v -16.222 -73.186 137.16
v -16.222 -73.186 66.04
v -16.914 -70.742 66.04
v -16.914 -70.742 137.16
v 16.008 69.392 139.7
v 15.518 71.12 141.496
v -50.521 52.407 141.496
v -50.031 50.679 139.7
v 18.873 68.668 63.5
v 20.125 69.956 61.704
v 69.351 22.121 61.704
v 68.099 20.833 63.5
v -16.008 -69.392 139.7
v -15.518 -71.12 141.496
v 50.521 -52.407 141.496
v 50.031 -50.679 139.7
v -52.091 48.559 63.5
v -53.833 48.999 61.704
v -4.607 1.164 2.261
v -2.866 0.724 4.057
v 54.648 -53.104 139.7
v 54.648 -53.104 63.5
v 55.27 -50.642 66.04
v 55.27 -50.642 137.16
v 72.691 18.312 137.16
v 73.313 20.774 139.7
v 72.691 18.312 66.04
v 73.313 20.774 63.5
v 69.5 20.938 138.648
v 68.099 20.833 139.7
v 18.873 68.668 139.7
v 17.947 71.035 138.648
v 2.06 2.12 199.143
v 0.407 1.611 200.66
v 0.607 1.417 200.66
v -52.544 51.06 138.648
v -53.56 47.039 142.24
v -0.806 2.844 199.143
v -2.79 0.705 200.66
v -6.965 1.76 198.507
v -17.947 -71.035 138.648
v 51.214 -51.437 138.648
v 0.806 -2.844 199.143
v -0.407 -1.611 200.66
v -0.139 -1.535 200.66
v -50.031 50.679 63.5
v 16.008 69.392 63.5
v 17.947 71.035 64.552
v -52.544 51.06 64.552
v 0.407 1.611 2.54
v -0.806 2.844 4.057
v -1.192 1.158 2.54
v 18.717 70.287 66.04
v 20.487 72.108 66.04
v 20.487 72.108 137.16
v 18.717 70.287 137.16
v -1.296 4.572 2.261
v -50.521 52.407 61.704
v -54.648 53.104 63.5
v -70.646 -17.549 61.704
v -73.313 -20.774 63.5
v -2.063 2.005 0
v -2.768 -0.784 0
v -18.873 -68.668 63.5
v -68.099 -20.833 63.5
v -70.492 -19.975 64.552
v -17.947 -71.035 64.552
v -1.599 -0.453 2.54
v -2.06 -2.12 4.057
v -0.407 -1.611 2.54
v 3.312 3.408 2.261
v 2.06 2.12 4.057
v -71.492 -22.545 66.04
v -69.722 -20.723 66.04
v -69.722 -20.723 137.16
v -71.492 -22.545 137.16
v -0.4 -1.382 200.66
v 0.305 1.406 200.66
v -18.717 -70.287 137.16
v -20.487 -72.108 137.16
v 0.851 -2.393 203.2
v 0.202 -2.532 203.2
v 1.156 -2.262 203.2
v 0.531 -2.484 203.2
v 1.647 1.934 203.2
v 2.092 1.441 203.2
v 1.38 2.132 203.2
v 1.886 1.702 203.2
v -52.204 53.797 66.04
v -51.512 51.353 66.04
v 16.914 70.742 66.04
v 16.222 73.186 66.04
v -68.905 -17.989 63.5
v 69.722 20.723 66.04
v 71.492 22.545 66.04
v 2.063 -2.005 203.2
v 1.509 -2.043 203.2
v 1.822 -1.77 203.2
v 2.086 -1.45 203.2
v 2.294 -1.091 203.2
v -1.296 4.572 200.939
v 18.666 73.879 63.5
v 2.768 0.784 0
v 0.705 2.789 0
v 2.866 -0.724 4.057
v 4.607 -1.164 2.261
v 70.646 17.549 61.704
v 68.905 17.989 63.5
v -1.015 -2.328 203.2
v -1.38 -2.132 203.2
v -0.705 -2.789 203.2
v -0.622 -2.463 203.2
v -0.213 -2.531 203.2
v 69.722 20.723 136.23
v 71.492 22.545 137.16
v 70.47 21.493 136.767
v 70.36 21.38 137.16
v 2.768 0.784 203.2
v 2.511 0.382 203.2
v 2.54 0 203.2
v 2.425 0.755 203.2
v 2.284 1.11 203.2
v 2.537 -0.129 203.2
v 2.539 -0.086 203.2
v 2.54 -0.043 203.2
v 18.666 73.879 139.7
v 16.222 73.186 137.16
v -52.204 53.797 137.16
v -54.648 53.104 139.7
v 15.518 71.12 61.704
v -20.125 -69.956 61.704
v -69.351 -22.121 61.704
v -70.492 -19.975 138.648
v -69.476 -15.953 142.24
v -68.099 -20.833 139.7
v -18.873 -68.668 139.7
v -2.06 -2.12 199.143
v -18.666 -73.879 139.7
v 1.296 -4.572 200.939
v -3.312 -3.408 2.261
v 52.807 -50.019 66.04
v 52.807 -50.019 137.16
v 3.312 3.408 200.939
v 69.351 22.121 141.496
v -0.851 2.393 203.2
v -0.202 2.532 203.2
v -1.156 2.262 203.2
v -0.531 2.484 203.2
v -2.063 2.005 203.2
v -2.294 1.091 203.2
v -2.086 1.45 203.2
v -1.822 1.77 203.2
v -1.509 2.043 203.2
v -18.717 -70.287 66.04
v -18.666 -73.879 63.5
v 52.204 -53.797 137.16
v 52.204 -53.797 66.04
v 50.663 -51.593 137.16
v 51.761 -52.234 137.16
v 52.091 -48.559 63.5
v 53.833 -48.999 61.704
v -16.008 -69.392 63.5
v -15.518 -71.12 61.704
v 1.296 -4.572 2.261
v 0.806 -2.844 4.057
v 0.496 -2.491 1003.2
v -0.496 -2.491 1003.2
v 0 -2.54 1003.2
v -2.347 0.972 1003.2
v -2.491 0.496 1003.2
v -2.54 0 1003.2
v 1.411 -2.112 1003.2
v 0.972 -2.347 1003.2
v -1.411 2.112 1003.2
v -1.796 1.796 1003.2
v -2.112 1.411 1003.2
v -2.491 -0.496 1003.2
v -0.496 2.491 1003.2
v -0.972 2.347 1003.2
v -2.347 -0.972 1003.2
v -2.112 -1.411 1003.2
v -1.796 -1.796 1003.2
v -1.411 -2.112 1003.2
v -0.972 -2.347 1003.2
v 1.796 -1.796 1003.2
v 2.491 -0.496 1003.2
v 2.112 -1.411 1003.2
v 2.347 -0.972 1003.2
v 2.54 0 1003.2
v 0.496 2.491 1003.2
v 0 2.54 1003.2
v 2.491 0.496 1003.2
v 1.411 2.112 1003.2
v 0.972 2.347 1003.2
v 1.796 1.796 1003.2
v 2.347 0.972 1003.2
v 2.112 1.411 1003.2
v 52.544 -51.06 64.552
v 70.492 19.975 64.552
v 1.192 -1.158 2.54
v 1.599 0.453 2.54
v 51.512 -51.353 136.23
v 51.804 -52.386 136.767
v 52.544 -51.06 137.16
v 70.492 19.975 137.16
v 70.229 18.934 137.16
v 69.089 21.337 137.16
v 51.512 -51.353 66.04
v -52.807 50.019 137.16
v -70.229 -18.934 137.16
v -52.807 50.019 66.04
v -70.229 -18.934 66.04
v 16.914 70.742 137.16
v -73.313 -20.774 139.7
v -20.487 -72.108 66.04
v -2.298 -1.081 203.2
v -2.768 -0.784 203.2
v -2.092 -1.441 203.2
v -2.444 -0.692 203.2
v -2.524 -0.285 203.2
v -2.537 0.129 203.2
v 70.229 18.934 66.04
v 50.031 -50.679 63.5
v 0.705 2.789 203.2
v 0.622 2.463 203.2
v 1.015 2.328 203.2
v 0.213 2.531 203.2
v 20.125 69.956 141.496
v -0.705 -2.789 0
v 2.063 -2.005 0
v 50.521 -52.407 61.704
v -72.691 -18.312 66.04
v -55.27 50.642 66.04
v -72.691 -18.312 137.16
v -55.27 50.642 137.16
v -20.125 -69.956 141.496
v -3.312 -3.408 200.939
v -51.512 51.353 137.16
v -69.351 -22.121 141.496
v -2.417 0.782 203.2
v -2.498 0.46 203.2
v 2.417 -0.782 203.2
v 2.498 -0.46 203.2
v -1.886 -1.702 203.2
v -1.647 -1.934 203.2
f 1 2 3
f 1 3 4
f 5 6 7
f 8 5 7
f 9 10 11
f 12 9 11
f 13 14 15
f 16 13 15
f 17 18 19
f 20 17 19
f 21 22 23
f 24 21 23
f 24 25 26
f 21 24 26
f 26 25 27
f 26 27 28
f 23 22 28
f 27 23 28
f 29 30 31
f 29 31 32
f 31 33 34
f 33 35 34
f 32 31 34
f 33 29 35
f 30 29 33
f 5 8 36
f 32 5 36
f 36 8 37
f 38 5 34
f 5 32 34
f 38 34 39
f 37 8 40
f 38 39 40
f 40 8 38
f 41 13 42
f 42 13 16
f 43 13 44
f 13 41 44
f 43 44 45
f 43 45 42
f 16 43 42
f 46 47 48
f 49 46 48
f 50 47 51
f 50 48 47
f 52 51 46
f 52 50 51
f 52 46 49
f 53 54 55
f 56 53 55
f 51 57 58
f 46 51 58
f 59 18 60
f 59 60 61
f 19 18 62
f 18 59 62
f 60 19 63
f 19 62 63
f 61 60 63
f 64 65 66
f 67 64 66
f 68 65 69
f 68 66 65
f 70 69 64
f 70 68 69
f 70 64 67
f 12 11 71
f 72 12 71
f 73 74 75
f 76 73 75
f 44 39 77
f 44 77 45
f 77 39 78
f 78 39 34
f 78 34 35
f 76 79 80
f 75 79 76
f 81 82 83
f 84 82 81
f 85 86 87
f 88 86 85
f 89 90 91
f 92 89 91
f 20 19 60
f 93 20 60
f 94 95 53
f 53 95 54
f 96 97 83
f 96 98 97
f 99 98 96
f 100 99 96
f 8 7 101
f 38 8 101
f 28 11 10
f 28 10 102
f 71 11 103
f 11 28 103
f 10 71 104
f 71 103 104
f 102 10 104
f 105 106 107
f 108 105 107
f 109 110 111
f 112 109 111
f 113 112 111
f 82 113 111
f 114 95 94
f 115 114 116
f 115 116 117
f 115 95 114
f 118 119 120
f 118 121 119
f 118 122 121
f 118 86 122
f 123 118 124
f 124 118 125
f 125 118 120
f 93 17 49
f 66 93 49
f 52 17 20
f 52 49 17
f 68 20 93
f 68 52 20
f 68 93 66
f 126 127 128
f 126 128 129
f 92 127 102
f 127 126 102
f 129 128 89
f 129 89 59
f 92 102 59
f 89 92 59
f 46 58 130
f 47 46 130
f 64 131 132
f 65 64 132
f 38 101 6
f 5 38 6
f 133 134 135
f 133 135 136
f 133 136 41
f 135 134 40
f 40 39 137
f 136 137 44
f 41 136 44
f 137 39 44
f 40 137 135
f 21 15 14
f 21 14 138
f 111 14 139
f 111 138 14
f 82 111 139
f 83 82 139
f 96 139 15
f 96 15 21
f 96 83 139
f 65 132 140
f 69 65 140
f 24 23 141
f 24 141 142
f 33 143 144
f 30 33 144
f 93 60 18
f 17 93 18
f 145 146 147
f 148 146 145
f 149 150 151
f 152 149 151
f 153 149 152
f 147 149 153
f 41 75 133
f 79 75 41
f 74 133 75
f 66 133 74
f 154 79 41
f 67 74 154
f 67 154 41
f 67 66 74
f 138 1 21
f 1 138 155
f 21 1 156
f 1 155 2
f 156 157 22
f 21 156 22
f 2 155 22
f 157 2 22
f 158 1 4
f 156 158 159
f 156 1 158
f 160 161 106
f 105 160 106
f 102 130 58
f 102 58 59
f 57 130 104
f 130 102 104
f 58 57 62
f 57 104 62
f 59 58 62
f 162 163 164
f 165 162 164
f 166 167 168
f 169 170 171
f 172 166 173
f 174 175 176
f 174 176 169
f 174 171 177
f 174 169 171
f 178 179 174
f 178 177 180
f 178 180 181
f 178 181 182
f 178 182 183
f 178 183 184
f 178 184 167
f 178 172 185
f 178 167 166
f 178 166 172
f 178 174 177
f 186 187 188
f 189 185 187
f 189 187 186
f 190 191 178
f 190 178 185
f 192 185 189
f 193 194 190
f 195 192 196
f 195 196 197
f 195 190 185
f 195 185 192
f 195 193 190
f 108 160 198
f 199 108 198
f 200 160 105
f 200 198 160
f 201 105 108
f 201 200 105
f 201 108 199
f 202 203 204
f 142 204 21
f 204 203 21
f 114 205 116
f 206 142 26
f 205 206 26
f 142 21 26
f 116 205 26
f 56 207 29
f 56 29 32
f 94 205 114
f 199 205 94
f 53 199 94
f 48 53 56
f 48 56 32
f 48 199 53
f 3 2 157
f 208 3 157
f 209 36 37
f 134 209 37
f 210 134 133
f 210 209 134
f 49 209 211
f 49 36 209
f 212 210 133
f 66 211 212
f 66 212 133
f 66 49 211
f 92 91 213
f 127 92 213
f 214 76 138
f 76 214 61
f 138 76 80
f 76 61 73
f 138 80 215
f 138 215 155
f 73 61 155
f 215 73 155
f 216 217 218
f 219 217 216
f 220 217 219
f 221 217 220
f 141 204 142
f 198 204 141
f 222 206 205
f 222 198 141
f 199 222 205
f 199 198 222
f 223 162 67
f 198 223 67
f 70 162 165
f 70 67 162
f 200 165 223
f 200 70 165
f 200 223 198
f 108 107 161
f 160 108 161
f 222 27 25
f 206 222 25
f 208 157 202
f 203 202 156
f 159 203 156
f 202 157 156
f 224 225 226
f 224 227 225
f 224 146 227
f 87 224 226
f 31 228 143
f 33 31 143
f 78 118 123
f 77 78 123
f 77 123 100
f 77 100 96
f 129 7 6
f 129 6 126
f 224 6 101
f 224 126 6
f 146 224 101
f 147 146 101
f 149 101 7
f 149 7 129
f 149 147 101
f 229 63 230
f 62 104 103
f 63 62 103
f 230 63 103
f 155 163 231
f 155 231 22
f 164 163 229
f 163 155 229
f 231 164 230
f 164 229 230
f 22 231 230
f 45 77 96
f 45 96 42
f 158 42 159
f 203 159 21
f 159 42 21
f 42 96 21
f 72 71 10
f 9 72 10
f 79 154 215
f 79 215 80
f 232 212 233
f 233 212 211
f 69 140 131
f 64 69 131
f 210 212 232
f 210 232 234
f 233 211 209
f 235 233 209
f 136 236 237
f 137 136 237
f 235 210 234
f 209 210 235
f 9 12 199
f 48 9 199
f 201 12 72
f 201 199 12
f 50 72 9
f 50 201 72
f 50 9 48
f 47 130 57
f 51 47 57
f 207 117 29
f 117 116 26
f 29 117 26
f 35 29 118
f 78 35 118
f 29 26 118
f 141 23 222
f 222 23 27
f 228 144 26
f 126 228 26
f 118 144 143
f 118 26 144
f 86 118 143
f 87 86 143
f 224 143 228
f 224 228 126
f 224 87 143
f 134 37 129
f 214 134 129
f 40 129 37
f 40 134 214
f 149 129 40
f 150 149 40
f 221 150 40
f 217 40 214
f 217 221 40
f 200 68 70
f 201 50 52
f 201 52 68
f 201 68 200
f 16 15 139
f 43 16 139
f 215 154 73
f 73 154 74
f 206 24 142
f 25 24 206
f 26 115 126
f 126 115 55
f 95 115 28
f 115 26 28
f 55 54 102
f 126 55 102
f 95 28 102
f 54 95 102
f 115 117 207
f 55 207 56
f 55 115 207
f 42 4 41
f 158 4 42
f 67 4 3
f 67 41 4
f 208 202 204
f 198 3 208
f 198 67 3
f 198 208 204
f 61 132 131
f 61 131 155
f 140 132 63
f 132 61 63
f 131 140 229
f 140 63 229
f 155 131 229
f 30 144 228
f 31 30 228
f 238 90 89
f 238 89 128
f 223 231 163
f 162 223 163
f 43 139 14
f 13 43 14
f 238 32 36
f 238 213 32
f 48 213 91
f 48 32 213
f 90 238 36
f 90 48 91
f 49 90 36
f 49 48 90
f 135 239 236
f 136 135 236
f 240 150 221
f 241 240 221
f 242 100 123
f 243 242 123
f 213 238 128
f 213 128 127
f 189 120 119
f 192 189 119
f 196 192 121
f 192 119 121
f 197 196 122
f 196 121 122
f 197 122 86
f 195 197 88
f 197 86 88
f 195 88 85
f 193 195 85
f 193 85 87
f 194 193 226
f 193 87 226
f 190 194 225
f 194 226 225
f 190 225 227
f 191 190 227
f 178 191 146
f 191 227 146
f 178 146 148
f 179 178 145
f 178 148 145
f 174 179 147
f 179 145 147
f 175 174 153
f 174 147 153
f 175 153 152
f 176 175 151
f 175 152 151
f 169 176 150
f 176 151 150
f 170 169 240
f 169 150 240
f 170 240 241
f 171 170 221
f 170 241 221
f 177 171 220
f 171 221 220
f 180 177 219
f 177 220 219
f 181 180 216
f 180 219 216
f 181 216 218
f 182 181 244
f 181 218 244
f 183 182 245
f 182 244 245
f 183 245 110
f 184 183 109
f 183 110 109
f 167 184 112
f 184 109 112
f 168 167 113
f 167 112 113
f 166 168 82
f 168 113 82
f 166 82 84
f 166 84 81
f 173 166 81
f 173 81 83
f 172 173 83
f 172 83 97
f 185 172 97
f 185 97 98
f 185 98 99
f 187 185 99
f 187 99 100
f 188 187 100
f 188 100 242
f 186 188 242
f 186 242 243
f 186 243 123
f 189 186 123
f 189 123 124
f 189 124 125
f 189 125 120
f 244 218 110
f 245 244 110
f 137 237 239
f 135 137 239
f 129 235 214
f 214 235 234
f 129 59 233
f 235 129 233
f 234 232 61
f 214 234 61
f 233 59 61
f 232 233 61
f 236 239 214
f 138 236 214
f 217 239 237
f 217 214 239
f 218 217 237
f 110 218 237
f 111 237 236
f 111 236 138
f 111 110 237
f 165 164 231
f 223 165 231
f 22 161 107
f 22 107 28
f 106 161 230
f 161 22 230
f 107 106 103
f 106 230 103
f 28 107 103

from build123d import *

# Parameters (mm, degrees)
F1_DEPTH  = 203.2
F2_SIZE   = 63.5
F3_T      = -2.54
F5_DEPTH  = 2.54
F7_DEPTH  = 2.54
F9_DEPTH  = 7.1852048969
F10_DEPTH = 2.541
F12_DEPTH = 2.54
F14_DEPTH = 2.54
F15_W     = 71.12
F15_H     = 71.12
F16_DEPTH = 157.0594794416
F17_W     = 71.12
F17_H     = 71.12
F18_DEPTH = 155.1690173594
F19_W     = 71.12
F19_H     = 71.12
F20_DEPTH = 170.067634702
F22_DEPTH = 2.54
F24_DEPTH = 2.54
F26_DEPTH = 2.54
F28_DEPTH = 2.54
F30_DEPTH = 2.54
F32_DEPTH = 2.54
F33_R     = 2.54
F34_DEPTH = 800


# Not quite as in the source:
# - a feature names something its author has since deleted; it is built from what else it names


with BuildPart() as f1:
    # F0 (on Top) → F1 (new body)
    with BuildSketch(Plane.XY):
        Polygon((73.3134762531, 20.774364002), (18.6656111534, 73.8785148759), (-54.6478650997, 53.104150874), (-73.3134762531, -20.774364002), (-18.6656111534, -73.8785148759), (54.6478650997, -53.104150874), align=None)
    extrude(amount=F1_DEPTH)

    # F2
    f2_edges = [f1.edges().sort_by_distance(p)[0] for p in [
        (45.989544, 47.326439, 203.2),
        (-17.991127, 63.491333, 203.2),
        (-63.980671, 16.164893, 203.2),
        (-45.989544, -47.326439, 203.2),
        (17.991127, -63.491333, 203.2),
        (63.980671, -16.164893, 203.2),
        (45.989544, 47.326439, 0),
        (-17.991127, 63.491333, 0),
        (-63.980671, 16.164893, 0),
        (-45.989544, -47.326439, 0),
        (17.991127, -63.491333, 0),
        (63.980671, -16.164893, 0),
    ]]
    chamfer(f2_edges, length=F2_SIZE)

    # F3
    f3_openings = [f1.faces().sort_by_distance(p)[0] for p in [
        (-42.712352, 10.791394, 161.636633),
    ]]
    offset(amount=F3_T, openings=f3_openings)

    # F4 (on face) → F5 (cut, through all)
    with BuildSketch(Plane(origin=(-71.6735768194, -73.7570960609, 102.8455678842), x_dir=(0.8701504485, -0.287188723, 0.4004507889), z_dir=(-0.4927861574, -0.5071112335, 0.7071067812))):
        Polygon((2.6696402664, 64.4858378393), (59.2408259088, 25.6139572621), (78.5633694658, 114.3351670347), align=None)
    extrude(amount=-F5_DEPTH, mode=Mode.SUBTRACT)

    # F6 (on face) → F7 (cut, through all)
    with BuildSketch(Plane(origin=(28.0387304884, -98.9496863361, 102.8455678842), x_dir=(0.9812423716, 0.1336581106, -0.1389205444), z_dir=(0.192778132, -0.6803209476, 0.7071067812))):
        Polygon((-44.3893807317, 46.8522479636), (22.9119959884, 60.3373077027), (-27.2544501276, 136.0217938087), align=None)
    extrude(amount=-F7_DEPTH, mode=Mode.SUBTRACT)

    # F8 (on face) → F9 (cut, through all)
    with BuildSketch(Plane(origin=(99.7123073078, -25.1925902753, 102.8455678842), x_dir=(0.7280120913, 0.1631104703, -0.6658778937), z_dir=(0.6855642894, -0.1732097142, 0.7071067812))):
        Polygon((-133.1636625665, 49.1073482105), (-134.131528973, 46.3985518281), (-61.9006782251, -18.3416021227), (-36.2615283041, 53.4154462512), align=None)
        Polygon((-63.0205602981, -13.9269250267), (-130.6368034196, 46.6771789529), (-39.925449456, 50.7100458165), align=None, mode=Mode.SUBTRACT)
    extrude(amount=-F9_DEPTH, mode=Mode.SUBTRACT)

    # F8 (on face) + F2_face2 (on face) → F10 (cut, through all)
    with BuildSketch(Plane(origin=(99.7123073078, -25.1925902753, 102.8455678842), x_dir=(0.7280120913, 0.1631104703, -0.6658778937), z_dir=(0.6855642894, -0.1732097142, 0.7071067812))):
        Polygon((-133.1636625665, 49.1073482105), (-134.131528973, 46.3985518281), (-61.9006782251, -18.3416021227), (-36.2615283041, 53.4154462512), align=None)
        Polygon((-63.0205602981, -13.9269250267), (-130.6368034196, 46.6771789529), (-39.925449456, 50.7100458165), align=None, mode=Mode.SUBTRACT)
    with BuildSketch(Plane(origin=(42.71235225, -10.7913939511, 161.636632955), x_dir=(0.2449555269, 0.969534316, 0), z_dir=(0.6855642894, -0.1732097142, 0.7071067812))):
        Polygon((-34.3195357799, -28.4830838377), (34.3195357799, -28.4830838377), (0, 55.5822670322), align=None)
    extrude(amount=-F10_DEPTH, mode=Mode.SUBTRACT)

    # F11 (on face) → F12 (cut, through all)
    with BuildSketch(Plane(origin=(71.6735768194, 73.7570960609, 102.8455678842), x_dir=(0.8701504485, -0.287188723, -0.4004507889), z_dir=(0.4927861574, 0.5071112335, 0.7071067812))):
        Polygon((-59.2408259088, -25.6139572621), (-78.5633694658, -114.3351670347), (-2.6696402664, -64.4858378393), align=None)
    extrude(amount=-F12_DEPTH, mode=Mode.SUBTRACT)

    # F13 (on face) → F14 (cut, through all)
    with BuildSketch(Plane(origin=(-28.0387304884, 98.9496863361, 102.8455678842), x_dir=(0.9812423716, 0.1336581106, 0.1389205444), z_dir=(-0.192778132, 0.6803209476, 0.7071067812))):
        Polygon((44.3893807317, -46.8522479636), (-22.9119959884, -60.3373077027), (27.2544501276, -136.0217938087), align=None)
    extrude(amount=-F14_DEPTH, mode=Mode.SUBTRACT)

    # F15 (on face) → F16 (cut, through all)
    with BuildSketch(Plane(origin=(17.9911269732, -63.4913328749, 0), x_dir=(0.9621191109, 0.2726294488, 0), z_dir=(0.2726294488, -0.9621191109, 0))):
        with Locations((0, 101.6)):
            Rectangle(F15_W, F15_H)
    extrude(amount=-F16_DEPTH, mode=Mode.SUBTRACT)

    # F17 (on face) → F18 (cut, through all)
    with BuildSketch(Plane(origin=(63.9806706764, -16.164893436, 0), x_dir=(0.2449555269, 0.969534316, 0), z_dir=(0.969534316, -0.2449555269, 0))):
        with Locations((0, 101.6)):
            Rectangle(F17_W, F17_H)
    extrude(amount=-F18_DEPTH, mode=Mode.SUBTRACT)

    # F19 (on face) → F20 (cut, through all)
    with BuildSketch(Plane(origin=(45.9895437032, 47.3264394389, 0), x_dir=(-0.717163584, 0.6969048671, 0), z_dir=(0.6969048671, 0.717163584, 0))):
        with Locations((0, 101.6)):
            Rectangle(F19_W, F19_H)
    extrude(amount=-F20_DEPTH, mode=Mode.SUBTRACT)

    # F21 (on face) → F22 (cut, through all)
    with BuildSketch(Plane(origin=(1.2076208066, -0.3051087374, -1.2455678842), x_dir=(0.7280120913, 0.1631104703, 0.6658778937), z_dir=(0.6855642894, -0.1732097142, -0.7071067812))):
        Polygon((95.3809385521, -2.3644010884), (72.2858277101, 62.2725697547), (4.6695845886, 1.6684657751), align=None)
    extrude(amount=-F22_DEPTH, mode=Mode.SUBTRACT)

    # F23 (on face) → F24 (cut, through all)
    with BuildSketch(Plane(origin=(0.8680423208, 0.8932759279, -1.2455678842), x_dir=(0.8701504485, -0.287188723, 0.4004507889), z_dir=(0.4927861574, 0.5071112335, -0.7071067812))):
        Polygon((22.13077439, -92.8080958564), (78.7019600324, -53.9362152793), (2.808230833, -4.0868860838), align=None)
    extrude(amount=-F24_DEPTH, mode=Mode.SUBTRACT)

    # F25 (on face) → F26 (cut, through all)
    with BuildSketch(Plane(origin=(-0.3395784858, 1.1983846653, -1.2455678842), x_dir=(0.9812423716, 0.1336581106, -0.1389205444), z_dir=(-0.192778132, 0.6803209476, -0.7071067812))):
        Polygon((16.1607261154, -94.0316157631), (-0.9742044888, -4.862069918), (-51.1406506047, -80.546556024), align=None)
    extrude(amount=-F26_DEPTH, mode=Mode.SUBTRACT)

    # F27 (on face) → F28 (cut, through all)
    with BuildSketch(Plane(origin=(-1.2076208066, 0.3051087374, -1.2455678842), x_dir=(0.7280120913, 0.1631104703, -0.6658778937), z_dir=(-0.6855642894, 0.1732097142, -0.7071067812))):
        Polygon((-72.2858277101, -62.2725697547), (-4.6695845886, -1.6684657751), (-95.3809385521, 2.3644010884), align=None)
    extrude(amount=-F28_DEPTH, mode=Mode.SUBTRACT)

    # F29 (on face) → F30 (cut, through all)
    with BuildSketch(Plane(origin=(-0.8680423208, -0.8932759279, -1.2455678842), x_dir=(0.8701504485, -0.287188723, -0.4004507889), z_dir=(-0.4927861574, -0.5071112335, -0.7071067812))):
        Polygon((-78.7019600324, 53.9362152793), (-2.808230833, 4.0868860838), (-22.13077439, 92.8080958564), align=None)
    extrude(amount=-F30_DEPTH, mode=Mode.SUBTRACT)

    # F31 (on face) → F32 (cut, through all)
    with BuildSketch(Plane(origin=(0.3395784858, -1.1983846653, -1.2455678842), x_dir=(0.9812423716, 0.1336581106, 0.1389205444), z_dir=(0.192778132, -0.6803209476, -0.7071067812))):
        Polygon((-16.1607261154, 94.0316157631), (0.9742044888, 4.862069918), (51.1406506047, 80.546556024), align=None)
    extrude(amount=-F32_DEPTH, mode=Mode.SUBTRACT)

    # F33 (on face) → F34 (join)
    with BuildSketch(Plane.XY.offset(203.2)):
        Circle(F33_R)
    extrude(amount=F34_DEPTH)


solid = f1.part
